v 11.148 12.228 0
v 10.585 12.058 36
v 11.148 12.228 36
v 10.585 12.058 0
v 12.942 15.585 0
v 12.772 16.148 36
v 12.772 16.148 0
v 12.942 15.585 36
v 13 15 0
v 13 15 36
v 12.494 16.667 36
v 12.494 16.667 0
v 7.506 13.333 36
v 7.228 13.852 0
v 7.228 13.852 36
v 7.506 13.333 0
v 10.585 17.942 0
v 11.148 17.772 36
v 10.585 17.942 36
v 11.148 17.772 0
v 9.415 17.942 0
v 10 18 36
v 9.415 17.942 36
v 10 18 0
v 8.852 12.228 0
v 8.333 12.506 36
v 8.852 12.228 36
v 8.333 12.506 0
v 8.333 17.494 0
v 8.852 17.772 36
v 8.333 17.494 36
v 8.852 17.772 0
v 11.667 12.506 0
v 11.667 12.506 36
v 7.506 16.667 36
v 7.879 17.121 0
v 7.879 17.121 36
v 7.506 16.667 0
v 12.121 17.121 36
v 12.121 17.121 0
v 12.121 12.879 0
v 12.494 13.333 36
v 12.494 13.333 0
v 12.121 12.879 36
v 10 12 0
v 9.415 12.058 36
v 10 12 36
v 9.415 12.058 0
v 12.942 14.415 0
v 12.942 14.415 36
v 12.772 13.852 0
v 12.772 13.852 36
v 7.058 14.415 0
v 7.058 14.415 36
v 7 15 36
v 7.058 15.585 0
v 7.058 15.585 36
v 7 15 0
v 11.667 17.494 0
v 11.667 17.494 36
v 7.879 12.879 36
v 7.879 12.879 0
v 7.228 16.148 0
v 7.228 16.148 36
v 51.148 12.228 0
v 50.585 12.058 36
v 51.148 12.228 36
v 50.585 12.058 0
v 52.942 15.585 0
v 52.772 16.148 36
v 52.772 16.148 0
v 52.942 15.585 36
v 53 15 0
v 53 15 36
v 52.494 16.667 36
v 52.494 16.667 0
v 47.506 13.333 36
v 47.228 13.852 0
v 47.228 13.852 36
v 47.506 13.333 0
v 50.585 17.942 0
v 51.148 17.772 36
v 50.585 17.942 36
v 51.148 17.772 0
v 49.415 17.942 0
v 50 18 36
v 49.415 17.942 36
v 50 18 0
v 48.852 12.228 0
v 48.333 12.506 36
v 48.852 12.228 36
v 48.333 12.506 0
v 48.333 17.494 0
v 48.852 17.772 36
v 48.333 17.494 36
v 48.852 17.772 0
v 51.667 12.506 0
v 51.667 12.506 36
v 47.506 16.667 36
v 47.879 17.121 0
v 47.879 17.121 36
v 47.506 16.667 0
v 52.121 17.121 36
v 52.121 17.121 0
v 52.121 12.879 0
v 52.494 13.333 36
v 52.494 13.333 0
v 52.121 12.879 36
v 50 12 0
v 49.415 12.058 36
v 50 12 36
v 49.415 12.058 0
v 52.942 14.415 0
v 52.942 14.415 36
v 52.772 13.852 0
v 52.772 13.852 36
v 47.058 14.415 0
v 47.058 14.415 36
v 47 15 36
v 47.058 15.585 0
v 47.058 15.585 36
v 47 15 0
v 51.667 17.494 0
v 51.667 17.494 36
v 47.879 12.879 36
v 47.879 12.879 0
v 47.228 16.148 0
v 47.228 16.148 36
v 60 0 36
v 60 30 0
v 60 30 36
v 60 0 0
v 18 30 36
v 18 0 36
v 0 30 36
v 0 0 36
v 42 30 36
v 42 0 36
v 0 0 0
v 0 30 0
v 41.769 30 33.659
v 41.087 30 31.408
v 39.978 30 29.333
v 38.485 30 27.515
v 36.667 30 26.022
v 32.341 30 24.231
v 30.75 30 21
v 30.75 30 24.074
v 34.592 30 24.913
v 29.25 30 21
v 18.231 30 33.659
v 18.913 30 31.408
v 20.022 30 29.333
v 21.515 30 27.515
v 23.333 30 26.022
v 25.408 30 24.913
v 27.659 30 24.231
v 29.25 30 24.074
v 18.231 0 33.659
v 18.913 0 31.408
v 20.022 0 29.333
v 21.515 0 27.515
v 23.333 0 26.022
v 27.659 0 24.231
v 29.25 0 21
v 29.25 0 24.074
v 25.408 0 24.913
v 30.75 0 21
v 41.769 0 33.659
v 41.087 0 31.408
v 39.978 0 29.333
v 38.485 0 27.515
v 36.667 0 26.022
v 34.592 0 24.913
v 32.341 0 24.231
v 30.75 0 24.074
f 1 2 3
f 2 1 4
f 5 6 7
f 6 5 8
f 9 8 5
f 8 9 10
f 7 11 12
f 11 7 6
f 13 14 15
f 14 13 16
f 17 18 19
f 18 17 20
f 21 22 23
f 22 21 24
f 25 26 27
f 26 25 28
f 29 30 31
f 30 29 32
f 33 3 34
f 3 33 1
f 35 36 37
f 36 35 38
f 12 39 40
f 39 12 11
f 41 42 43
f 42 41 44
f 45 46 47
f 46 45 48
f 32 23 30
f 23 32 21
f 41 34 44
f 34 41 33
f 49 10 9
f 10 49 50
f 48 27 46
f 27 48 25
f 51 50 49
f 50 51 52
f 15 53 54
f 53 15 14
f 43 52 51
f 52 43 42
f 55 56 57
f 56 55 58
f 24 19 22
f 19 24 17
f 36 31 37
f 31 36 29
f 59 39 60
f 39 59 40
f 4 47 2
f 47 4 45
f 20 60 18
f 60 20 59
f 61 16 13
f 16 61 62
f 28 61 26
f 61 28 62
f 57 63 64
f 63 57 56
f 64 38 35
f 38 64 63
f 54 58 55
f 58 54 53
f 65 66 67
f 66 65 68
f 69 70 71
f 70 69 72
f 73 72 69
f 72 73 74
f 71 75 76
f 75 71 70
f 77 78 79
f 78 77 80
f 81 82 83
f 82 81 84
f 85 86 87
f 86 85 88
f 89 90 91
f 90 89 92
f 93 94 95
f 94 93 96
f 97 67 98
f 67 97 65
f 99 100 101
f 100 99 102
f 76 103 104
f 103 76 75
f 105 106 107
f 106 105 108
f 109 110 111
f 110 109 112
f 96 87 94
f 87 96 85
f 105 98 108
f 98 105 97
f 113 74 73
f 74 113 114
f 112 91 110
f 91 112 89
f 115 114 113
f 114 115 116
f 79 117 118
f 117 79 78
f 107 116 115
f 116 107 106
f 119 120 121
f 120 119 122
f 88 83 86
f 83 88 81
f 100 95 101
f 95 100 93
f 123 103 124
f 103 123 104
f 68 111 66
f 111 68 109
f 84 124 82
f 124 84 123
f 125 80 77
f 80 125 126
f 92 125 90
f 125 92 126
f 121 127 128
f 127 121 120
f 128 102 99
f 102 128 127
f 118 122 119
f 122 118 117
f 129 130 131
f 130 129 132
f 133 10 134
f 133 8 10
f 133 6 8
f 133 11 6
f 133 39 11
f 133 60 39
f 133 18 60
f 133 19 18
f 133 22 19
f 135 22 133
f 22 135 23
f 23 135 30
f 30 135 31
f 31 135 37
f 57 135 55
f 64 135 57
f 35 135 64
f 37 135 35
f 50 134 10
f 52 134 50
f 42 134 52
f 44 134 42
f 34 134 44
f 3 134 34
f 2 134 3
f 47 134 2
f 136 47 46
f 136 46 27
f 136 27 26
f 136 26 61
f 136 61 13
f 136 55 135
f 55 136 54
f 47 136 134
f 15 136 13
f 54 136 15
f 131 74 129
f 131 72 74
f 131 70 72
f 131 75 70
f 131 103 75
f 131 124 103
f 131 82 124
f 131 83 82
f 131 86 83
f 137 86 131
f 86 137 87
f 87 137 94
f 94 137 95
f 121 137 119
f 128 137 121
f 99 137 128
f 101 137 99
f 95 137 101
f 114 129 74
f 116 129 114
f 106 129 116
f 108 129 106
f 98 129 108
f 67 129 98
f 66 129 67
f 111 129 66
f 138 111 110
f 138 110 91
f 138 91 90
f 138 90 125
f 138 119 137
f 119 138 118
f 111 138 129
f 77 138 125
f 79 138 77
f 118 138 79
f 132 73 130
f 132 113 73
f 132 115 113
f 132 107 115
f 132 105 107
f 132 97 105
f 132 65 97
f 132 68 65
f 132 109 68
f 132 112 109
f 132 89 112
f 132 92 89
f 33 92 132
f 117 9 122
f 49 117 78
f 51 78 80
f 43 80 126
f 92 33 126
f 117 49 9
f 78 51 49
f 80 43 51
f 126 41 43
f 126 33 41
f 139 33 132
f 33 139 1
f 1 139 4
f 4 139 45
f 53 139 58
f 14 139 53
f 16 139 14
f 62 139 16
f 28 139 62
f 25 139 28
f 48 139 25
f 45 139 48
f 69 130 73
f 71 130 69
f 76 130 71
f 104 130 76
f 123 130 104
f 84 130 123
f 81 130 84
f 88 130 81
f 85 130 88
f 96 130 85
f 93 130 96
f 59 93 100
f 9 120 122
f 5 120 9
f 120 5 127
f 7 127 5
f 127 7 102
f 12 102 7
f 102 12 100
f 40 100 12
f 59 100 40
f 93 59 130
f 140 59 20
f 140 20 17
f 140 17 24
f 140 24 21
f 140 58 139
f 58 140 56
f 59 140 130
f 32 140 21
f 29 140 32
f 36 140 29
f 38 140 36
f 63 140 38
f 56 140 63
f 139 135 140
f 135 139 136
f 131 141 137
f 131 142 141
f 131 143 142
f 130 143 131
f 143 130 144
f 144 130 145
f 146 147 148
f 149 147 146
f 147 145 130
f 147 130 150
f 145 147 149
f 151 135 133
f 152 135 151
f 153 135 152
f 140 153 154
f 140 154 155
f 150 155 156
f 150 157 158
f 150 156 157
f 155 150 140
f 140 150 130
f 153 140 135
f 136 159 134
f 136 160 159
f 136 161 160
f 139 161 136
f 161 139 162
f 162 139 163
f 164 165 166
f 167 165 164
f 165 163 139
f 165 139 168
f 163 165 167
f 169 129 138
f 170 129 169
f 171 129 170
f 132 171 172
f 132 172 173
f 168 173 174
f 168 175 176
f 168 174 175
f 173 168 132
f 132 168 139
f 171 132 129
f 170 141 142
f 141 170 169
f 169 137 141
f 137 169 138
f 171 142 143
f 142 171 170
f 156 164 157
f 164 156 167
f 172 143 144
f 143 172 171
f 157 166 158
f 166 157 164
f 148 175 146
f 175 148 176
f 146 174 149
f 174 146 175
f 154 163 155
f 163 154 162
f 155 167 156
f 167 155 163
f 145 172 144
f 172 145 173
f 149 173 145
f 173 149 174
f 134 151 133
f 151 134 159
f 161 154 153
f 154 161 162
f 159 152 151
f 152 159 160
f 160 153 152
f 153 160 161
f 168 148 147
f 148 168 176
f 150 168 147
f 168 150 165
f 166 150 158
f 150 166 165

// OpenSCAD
$fn = 32;

// ----------------------------------------------------------------------
// Saddle clamp: split shaft clamp
// ----------------------------------------------------------------------

// --- parameters (mm) ---
blk_l = 60;               // block length, X
blk_w = 30;               // block width, Y
blk_h = 36;               // block height
clamp_r = 12;             // shaft groove radius
hole_r = 3;               // bolt hole radius
hole_m = 10;              // bolt hole margin from the ends
saw_w = 1.5;              // saw kerf width

saw_depth = clamp_r + 3;  // saw kerf depth

difference() {
  cube([blk_l, blk_w, blk_h]);
  translate([blk_l / 2, -1, blk_h])
    rotate([-90, 0, 0])
      cylinder(h = blk_w + 2, r = clamp_r);
  for (sx = [0, 1])
    translate([sx ? blk_l - hole_m : hole_m, blk_w / 2, -1])
      cylinder(r = hole_r, h = blk_h + 2);
  translate([blk_l / 2 - saw_w / 2, -1, blk_h - saw_depth])
    cube([saw_w, blk_w + 2, saw_depth + 1]);
}
